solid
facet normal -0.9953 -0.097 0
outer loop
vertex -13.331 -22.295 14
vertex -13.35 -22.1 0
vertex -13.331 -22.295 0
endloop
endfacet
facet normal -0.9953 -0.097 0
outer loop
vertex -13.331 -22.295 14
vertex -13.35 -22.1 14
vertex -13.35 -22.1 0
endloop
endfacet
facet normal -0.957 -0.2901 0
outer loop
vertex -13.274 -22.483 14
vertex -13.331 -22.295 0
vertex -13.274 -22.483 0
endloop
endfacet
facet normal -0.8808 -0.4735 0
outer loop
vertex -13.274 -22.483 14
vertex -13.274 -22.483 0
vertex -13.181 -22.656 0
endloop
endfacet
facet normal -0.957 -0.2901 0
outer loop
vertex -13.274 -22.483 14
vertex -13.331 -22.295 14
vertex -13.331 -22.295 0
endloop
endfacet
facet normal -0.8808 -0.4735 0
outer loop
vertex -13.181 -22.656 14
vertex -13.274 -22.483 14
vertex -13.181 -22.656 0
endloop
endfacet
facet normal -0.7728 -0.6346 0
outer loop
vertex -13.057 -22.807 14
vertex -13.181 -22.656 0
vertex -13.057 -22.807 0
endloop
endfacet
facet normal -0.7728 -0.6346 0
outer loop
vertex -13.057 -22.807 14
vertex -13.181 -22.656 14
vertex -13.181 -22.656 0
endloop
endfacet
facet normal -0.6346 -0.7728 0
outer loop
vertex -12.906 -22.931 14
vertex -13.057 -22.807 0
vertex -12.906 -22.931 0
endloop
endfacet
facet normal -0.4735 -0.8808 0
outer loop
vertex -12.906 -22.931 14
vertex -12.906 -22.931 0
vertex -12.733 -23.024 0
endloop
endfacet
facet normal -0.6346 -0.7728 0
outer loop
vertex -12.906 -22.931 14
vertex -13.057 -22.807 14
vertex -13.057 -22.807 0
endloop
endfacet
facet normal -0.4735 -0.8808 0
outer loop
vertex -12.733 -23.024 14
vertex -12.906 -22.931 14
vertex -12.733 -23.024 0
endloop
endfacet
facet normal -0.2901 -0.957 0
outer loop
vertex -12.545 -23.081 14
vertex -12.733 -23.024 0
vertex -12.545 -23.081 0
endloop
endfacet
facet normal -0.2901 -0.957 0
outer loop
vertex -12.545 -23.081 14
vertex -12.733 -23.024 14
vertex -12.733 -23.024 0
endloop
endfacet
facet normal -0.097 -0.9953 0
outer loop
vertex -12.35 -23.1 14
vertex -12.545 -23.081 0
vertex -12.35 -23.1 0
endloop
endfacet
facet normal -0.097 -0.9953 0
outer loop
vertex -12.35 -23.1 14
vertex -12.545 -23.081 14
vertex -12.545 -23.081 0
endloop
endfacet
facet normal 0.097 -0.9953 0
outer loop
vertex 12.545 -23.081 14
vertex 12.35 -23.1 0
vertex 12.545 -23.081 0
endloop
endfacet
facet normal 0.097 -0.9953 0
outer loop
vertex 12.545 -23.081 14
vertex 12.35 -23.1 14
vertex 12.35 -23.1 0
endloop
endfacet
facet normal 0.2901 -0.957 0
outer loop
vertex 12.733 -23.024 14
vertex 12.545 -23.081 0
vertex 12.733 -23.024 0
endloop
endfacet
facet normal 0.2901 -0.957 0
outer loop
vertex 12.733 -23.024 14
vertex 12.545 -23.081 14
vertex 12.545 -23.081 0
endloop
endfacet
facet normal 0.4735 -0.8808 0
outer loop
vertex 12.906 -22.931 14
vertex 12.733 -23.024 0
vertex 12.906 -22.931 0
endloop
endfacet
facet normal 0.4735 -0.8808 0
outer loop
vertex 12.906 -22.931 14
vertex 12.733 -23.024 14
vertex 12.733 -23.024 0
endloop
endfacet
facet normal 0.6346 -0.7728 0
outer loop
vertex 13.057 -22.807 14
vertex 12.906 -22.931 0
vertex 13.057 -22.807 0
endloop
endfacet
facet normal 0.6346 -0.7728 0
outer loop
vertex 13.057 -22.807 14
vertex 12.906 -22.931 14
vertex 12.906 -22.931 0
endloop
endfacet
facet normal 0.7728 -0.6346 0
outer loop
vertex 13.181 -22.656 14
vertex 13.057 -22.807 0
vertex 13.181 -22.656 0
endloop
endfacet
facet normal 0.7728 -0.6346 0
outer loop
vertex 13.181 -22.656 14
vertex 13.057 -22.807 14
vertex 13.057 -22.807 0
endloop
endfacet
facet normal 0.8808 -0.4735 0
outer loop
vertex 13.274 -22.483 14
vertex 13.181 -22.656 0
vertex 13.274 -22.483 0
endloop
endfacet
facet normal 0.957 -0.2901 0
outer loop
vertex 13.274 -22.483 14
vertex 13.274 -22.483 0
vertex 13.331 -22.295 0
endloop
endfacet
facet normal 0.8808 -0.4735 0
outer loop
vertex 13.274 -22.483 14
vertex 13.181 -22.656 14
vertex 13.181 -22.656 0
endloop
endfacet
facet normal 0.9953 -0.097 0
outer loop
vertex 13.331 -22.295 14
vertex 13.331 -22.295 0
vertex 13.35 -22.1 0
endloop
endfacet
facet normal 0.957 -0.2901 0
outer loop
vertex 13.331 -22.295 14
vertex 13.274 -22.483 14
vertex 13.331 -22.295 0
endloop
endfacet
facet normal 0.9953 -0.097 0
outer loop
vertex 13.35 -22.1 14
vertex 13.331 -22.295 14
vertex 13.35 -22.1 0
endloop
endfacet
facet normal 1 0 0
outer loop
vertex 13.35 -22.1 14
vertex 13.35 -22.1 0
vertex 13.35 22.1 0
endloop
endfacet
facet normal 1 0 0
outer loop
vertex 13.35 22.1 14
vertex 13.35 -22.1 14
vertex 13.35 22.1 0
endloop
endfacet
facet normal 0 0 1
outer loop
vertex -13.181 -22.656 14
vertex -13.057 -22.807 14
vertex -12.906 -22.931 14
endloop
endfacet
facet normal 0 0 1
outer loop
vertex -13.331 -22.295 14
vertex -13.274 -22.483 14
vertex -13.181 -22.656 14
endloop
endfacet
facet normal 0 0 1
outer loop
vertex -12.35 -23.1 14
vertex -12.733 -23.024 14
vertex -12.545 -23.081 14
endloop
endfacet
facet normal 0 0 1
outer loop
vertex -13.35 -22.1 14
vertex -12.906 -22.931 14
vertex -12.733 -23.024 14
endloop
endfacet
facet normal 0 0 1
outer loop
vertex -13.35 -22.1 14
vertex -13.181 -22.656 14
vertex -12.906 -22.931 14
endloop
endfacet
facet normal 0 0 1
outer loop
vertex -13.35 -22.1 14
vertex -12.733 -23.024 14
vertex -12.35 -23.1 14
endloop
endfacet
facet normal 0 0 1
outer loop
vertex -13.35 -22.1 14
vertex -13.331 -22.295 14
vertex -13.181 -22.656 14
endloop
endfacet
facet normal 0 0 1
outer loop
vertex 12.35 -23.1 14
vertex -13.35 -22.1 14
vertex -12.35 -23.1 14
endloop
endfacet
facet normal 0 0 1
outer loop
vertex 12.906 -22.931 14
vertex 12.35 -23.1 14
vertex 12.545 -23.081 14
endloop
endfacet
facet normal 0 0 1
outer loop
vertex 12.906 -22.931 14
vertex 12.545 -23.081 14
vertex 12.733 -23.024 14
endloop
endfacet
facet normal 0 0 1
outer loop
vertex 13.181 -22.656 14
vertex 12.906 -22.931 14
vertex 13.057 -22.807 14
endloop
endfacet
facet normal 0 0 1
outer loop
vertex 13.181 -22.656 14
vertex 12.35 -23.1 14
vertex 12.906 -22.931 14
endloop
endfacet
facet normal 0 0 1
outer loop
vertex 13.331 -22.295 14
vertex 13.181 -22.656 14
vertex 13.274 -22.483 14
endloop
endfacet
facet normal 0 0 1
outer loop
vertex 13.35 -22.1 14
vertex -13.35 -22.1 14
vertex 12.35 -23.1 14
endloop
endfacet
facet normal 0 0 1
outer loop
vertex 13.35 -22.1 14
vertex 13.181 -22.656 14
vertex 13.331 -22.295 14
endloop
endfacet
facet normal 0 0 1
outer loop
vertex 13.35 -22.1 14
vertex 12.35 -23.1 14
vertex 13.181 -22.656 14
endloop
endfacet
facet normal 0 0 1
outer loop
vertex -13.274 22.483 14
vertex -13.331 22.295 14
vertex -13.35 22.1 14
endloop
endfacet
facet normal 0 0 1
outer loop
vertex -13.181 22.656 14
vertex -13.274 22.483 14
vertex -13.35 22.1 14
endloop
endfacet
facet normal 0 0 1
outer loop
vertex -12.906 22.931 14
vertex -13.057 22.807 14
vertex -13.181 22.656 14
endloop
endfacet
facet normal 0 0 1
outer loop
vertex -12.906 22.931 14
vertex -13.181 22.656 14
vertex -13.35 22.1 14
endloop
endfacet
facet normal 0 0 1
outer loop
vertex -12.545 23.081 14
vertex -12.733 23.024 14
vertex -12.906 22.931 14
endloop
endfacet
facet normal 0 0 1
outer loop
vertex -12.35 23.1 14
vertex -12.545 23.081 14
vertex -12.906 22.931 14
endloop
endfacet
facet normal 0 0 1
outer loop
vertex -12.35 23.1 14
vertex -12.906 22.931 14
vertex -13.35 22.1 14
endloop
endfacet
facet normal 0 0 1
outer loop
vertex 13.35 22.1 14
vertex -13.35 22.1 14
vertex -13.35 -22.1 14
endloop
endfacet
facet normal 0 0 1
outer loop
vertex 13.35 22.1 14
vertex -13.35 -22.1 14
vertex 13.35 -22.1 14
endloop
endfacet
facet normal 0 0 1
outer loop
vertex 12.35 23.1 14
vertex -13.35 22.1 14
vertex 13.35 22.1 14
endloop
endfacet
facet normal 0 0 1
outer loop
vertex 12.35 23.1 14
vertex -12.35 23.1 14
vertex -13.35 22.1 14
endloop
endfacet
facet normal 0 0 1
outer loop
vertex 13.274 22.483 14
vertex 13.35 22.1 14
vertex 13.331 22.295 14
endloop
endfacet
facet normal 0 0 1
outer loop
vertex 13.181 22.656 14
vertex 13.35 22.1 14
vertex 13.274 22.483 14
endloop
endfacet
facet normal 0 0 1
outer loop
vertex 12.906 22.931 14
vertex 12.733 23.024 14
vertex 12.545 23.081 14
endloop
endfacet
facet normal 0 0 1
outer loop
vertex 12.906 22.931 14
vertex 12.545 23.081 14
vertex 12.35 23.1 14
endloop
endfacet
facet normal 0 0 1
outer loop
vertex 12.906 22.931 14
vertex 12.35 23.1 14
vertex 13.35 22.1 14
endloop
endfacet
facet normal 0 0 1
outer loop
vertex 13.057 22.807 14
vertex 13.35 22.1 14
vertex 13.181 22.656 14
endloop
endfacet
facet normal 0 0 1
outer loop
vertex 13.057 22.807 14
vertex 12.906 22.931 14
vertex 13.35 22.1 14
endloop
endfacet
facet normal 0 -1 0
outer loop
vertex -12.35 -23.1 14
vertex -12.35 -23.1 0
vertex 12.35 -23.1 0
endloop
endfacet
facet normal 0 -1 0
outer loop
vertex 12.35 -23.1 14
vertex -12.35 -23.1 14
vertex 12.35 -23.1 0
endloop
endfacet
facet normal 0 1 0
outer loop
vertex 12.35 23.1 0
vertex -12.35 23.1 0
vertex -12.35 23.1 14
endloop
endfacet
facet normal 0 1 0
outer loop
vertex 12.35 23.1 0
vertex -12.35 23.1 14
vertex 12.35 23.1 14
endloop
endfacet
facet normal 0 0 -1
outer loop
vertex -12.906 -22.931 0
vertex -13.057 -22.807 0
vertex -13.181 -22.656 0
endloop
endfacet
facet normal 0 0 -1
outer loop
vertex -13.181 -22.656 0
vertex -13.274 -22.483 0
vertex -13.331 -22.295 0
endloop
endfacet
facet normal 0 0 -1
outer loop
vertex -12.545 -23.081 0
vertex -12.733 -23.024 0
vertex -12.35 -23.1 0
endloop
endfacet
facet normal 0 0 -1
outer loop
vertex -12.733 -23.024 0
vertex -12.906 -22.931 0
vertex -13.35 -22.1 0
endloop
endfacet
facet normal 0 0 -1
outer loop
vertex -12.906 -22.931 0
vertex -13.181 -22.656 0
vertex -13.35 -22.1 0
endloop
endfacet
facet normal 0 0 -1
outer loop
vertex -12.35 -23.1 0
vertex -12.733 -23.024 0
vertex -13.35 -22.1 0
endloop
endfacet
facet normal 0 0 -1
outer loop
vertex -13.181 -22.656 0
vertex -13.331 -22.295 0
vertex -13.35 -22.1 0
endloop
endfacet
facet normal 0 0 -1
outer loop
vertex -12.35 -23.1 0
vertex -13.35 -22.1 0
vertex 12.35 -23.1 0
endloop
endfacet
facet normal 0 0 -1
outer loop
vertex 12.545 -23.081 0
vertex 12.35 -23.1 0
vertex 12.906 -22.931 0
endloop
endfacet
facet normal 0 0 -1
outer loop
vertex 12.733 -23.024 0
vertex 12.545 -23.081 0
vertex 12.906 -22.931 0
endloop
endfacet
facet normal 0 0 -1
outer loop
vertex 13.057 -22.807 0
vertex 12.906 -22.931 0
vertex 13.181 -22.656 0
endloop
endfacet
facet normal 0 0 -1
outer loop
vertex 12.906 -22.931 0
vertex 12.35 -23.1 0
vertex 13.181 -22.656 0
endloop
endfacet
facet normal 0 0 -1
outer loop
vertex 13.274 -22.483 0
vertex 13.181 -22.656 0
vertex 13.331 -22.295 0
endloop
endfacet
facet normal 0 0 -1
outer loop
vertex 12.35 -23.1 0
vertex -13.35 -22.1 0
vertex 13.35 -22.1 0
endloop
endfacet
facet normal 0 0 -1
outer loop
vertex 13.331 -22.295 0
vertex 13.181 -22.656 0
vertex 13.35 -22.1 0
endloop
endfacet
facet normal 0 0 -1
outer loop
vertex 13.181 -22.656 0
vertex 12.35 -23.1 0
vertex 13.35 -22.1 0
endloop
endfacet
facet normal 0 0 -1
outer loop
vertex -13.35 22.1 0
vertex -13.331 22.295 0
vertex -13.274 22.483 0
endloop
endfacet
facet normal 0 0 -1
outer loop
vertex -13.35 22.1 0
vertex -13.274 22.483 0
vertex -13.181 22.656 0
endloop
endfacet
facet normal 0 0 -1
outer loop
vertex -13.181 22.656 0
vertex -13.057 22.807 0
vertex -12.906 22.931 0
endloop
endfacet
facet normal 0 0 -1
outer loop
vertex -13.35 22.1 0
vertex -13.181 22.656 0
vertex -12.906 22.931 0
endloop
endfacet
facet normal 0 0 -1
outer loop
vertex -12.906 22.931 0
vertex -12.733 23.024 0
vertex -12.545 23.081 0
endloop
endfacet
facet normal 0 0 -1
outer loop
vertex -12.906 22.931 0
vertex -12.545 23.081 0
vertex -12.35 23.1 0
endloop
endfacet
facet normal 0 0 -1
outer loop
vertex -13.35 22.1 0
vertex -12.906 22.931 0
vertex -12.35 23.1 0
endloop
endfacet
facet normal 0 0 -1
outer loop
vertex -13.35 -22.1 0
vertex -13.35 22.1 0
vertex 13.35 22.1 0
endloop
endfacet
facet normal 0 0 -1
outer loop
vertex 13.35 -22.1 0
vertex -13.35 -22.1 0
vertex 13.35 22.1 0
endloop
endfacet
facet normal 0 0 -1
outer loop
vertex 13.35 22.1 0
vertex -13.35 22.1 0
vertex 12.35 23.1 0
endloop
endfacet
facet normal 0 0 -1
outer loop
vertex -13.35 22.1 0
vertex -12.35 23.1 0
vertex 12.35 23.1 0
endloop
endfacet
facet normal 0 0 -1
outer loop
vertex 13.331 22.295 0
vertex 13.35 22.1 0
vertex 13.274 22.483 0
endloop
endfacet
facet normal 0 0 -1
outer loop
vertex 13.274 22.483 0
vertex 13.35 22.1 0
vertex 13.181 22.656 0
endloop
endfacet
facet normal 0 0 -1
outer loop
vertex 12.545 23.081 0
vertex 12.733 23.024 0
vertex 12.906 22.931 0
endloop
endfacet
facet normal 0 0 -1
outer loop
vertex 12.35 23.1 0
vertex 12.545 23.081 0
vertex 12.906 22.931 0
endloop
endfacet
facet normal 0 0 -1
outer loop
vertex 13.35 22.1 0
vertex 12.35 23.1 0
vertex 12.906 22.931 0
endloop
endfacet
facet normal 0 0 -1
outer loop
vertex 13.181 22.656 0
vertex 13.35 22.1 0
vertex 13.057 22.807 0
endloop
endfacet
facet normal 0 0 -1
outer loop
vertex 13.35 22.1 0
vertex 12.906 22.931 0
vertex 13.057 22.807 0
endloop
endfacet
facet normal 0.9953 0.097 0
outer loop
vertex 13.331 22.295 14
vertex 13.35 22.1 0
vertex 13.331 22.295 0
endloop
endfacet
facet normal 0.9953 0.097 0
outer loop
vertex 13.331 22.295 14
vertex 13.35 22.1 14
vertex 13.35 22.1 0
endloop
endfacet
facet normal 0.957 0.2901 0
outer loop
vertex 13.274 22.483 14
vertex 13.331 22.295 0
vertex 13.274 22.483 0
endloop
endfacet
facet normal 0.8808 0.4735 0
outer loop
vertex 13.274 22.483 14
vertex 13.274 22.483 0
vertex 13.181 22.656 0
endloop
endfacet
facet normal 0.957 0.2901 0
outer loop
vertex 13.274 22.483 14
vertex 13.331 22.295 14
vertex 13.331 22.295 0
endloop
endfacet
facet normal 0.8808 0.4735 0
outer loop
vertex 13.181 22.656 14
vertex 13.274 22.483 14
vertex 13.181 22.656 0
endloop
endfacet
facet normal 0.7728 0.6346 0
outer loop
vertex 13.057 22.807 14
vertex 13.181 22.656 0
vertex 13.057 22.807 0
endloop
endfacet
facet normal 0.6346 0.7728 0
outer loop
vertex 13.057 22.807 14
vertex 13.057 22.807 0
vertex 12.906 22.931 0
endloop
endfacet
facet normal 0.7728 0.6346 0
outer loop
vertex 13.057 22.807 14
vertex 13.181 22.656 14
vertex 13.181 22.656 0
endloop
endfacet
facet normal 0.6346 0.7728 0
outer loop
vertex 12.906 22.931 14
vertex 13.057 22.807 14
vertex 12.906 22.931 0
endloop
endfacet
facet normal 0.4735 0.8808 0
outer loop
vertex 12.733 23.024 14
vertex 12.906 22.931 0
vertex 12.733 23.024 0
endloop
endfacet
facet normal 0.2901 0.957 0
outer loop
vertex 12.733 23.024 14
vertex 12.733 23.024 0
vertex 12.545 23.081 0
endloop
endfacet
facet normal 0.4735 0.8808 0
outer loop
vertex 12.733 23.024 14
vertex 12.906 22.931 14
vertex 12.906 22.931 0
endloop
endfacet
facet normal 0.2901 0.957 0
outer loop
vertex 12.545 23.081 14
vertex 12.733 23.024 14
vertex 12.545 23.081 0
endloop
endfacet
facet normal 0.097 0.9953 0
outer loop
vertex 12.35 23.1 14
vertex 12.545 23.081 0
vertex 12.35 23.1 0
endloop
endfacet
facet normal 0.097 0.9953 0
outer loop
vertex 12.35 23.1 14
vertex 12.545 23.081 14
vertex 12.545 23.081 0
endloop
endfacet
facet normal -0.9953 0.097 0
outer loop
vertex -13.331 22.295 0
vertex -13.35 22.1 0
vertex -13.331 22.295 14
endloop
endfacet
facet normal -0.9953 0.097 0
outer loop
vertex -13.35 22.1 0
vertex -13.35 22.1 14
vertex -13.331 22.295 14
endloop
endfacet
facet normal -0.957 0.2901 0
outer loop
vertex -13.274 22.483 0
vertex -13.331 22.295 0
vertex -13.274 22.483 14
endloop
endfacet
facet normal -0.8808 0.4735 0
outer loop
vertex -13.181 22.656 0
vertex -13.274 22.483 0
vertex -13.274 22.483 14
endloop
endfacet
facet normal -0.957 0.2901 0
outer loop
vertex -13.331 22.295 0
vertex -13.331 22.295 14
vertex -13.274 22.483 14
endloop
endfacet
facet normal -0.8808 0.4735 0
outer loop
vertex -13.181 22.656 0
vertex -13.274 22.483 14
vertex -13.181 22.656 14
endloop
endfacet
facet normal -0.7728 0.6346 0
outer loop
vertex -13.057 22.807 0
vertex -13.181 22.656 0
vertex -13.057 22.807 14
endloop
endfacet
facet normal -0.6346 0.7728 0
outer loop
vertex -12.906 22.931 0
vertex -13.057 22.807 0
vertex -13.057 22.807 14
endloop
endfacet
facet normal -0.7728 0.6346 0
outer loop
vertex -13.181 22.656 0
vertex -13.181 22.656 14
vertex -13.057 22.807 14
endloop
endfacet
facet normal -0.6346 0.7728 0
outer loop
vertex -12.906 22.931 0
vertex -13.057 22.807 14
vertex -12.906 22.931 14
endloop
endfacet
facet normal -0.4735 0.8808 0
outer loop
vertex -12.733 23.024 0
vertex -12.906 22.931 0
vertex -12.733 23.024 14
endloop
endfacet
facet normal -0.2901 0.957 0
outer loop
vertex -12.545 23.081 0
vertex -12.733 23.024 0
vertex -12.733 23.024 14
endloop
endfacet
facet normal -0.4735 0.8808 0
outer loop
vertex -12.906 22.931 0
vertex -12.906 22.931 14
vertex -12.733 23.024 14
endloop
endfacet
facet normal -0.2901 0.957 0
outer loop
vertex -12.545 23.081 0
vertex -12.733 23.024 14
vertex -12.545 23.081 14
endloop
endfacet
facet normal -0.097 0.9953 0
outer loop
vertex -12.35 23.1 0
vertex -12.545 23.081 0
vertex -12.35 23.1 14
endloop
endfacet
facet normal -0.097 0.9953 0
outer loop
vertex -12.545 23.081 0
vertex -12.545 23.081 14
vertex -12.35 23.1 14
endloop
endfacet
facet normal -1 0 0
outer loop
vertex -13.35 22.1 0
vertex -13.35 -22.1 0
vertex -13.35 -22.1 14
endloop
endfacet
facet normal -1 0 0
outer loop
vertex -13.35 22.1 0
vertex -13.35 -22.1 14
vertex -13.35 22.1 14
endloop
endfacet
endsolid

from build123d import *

# Parameters (mm, degrees)
ESQUISSE1_W        = 26.7
ESQUISSE1_H        = 46.2
BOSS_EXTRU_1_DEPTH = 14
CONG_1_R           = 1


with BuildPart() as part:
    # Esquisse1 → Boss.-Extru.1 (new body)
    with BuildSketch(Plane.XY):
        Rectangle(ESQUISSE1_W, ESQUISSE1_H)
    extrude(amount=BOSS_EXTRU_1_DEPTH)

    # Congé1
    cong_1_edges = [part.edges().sort_by_distance(p)[0] for p in [
        (-13.35, 23.1, 7),
        (13.35, 23.1, 7),
        (13.35, -23.1, 7),
        (-13.35, -23.1, 7),
    ]]
    fillet(cong_1_edges, radius=CONG_1_R)


solid = part.part
